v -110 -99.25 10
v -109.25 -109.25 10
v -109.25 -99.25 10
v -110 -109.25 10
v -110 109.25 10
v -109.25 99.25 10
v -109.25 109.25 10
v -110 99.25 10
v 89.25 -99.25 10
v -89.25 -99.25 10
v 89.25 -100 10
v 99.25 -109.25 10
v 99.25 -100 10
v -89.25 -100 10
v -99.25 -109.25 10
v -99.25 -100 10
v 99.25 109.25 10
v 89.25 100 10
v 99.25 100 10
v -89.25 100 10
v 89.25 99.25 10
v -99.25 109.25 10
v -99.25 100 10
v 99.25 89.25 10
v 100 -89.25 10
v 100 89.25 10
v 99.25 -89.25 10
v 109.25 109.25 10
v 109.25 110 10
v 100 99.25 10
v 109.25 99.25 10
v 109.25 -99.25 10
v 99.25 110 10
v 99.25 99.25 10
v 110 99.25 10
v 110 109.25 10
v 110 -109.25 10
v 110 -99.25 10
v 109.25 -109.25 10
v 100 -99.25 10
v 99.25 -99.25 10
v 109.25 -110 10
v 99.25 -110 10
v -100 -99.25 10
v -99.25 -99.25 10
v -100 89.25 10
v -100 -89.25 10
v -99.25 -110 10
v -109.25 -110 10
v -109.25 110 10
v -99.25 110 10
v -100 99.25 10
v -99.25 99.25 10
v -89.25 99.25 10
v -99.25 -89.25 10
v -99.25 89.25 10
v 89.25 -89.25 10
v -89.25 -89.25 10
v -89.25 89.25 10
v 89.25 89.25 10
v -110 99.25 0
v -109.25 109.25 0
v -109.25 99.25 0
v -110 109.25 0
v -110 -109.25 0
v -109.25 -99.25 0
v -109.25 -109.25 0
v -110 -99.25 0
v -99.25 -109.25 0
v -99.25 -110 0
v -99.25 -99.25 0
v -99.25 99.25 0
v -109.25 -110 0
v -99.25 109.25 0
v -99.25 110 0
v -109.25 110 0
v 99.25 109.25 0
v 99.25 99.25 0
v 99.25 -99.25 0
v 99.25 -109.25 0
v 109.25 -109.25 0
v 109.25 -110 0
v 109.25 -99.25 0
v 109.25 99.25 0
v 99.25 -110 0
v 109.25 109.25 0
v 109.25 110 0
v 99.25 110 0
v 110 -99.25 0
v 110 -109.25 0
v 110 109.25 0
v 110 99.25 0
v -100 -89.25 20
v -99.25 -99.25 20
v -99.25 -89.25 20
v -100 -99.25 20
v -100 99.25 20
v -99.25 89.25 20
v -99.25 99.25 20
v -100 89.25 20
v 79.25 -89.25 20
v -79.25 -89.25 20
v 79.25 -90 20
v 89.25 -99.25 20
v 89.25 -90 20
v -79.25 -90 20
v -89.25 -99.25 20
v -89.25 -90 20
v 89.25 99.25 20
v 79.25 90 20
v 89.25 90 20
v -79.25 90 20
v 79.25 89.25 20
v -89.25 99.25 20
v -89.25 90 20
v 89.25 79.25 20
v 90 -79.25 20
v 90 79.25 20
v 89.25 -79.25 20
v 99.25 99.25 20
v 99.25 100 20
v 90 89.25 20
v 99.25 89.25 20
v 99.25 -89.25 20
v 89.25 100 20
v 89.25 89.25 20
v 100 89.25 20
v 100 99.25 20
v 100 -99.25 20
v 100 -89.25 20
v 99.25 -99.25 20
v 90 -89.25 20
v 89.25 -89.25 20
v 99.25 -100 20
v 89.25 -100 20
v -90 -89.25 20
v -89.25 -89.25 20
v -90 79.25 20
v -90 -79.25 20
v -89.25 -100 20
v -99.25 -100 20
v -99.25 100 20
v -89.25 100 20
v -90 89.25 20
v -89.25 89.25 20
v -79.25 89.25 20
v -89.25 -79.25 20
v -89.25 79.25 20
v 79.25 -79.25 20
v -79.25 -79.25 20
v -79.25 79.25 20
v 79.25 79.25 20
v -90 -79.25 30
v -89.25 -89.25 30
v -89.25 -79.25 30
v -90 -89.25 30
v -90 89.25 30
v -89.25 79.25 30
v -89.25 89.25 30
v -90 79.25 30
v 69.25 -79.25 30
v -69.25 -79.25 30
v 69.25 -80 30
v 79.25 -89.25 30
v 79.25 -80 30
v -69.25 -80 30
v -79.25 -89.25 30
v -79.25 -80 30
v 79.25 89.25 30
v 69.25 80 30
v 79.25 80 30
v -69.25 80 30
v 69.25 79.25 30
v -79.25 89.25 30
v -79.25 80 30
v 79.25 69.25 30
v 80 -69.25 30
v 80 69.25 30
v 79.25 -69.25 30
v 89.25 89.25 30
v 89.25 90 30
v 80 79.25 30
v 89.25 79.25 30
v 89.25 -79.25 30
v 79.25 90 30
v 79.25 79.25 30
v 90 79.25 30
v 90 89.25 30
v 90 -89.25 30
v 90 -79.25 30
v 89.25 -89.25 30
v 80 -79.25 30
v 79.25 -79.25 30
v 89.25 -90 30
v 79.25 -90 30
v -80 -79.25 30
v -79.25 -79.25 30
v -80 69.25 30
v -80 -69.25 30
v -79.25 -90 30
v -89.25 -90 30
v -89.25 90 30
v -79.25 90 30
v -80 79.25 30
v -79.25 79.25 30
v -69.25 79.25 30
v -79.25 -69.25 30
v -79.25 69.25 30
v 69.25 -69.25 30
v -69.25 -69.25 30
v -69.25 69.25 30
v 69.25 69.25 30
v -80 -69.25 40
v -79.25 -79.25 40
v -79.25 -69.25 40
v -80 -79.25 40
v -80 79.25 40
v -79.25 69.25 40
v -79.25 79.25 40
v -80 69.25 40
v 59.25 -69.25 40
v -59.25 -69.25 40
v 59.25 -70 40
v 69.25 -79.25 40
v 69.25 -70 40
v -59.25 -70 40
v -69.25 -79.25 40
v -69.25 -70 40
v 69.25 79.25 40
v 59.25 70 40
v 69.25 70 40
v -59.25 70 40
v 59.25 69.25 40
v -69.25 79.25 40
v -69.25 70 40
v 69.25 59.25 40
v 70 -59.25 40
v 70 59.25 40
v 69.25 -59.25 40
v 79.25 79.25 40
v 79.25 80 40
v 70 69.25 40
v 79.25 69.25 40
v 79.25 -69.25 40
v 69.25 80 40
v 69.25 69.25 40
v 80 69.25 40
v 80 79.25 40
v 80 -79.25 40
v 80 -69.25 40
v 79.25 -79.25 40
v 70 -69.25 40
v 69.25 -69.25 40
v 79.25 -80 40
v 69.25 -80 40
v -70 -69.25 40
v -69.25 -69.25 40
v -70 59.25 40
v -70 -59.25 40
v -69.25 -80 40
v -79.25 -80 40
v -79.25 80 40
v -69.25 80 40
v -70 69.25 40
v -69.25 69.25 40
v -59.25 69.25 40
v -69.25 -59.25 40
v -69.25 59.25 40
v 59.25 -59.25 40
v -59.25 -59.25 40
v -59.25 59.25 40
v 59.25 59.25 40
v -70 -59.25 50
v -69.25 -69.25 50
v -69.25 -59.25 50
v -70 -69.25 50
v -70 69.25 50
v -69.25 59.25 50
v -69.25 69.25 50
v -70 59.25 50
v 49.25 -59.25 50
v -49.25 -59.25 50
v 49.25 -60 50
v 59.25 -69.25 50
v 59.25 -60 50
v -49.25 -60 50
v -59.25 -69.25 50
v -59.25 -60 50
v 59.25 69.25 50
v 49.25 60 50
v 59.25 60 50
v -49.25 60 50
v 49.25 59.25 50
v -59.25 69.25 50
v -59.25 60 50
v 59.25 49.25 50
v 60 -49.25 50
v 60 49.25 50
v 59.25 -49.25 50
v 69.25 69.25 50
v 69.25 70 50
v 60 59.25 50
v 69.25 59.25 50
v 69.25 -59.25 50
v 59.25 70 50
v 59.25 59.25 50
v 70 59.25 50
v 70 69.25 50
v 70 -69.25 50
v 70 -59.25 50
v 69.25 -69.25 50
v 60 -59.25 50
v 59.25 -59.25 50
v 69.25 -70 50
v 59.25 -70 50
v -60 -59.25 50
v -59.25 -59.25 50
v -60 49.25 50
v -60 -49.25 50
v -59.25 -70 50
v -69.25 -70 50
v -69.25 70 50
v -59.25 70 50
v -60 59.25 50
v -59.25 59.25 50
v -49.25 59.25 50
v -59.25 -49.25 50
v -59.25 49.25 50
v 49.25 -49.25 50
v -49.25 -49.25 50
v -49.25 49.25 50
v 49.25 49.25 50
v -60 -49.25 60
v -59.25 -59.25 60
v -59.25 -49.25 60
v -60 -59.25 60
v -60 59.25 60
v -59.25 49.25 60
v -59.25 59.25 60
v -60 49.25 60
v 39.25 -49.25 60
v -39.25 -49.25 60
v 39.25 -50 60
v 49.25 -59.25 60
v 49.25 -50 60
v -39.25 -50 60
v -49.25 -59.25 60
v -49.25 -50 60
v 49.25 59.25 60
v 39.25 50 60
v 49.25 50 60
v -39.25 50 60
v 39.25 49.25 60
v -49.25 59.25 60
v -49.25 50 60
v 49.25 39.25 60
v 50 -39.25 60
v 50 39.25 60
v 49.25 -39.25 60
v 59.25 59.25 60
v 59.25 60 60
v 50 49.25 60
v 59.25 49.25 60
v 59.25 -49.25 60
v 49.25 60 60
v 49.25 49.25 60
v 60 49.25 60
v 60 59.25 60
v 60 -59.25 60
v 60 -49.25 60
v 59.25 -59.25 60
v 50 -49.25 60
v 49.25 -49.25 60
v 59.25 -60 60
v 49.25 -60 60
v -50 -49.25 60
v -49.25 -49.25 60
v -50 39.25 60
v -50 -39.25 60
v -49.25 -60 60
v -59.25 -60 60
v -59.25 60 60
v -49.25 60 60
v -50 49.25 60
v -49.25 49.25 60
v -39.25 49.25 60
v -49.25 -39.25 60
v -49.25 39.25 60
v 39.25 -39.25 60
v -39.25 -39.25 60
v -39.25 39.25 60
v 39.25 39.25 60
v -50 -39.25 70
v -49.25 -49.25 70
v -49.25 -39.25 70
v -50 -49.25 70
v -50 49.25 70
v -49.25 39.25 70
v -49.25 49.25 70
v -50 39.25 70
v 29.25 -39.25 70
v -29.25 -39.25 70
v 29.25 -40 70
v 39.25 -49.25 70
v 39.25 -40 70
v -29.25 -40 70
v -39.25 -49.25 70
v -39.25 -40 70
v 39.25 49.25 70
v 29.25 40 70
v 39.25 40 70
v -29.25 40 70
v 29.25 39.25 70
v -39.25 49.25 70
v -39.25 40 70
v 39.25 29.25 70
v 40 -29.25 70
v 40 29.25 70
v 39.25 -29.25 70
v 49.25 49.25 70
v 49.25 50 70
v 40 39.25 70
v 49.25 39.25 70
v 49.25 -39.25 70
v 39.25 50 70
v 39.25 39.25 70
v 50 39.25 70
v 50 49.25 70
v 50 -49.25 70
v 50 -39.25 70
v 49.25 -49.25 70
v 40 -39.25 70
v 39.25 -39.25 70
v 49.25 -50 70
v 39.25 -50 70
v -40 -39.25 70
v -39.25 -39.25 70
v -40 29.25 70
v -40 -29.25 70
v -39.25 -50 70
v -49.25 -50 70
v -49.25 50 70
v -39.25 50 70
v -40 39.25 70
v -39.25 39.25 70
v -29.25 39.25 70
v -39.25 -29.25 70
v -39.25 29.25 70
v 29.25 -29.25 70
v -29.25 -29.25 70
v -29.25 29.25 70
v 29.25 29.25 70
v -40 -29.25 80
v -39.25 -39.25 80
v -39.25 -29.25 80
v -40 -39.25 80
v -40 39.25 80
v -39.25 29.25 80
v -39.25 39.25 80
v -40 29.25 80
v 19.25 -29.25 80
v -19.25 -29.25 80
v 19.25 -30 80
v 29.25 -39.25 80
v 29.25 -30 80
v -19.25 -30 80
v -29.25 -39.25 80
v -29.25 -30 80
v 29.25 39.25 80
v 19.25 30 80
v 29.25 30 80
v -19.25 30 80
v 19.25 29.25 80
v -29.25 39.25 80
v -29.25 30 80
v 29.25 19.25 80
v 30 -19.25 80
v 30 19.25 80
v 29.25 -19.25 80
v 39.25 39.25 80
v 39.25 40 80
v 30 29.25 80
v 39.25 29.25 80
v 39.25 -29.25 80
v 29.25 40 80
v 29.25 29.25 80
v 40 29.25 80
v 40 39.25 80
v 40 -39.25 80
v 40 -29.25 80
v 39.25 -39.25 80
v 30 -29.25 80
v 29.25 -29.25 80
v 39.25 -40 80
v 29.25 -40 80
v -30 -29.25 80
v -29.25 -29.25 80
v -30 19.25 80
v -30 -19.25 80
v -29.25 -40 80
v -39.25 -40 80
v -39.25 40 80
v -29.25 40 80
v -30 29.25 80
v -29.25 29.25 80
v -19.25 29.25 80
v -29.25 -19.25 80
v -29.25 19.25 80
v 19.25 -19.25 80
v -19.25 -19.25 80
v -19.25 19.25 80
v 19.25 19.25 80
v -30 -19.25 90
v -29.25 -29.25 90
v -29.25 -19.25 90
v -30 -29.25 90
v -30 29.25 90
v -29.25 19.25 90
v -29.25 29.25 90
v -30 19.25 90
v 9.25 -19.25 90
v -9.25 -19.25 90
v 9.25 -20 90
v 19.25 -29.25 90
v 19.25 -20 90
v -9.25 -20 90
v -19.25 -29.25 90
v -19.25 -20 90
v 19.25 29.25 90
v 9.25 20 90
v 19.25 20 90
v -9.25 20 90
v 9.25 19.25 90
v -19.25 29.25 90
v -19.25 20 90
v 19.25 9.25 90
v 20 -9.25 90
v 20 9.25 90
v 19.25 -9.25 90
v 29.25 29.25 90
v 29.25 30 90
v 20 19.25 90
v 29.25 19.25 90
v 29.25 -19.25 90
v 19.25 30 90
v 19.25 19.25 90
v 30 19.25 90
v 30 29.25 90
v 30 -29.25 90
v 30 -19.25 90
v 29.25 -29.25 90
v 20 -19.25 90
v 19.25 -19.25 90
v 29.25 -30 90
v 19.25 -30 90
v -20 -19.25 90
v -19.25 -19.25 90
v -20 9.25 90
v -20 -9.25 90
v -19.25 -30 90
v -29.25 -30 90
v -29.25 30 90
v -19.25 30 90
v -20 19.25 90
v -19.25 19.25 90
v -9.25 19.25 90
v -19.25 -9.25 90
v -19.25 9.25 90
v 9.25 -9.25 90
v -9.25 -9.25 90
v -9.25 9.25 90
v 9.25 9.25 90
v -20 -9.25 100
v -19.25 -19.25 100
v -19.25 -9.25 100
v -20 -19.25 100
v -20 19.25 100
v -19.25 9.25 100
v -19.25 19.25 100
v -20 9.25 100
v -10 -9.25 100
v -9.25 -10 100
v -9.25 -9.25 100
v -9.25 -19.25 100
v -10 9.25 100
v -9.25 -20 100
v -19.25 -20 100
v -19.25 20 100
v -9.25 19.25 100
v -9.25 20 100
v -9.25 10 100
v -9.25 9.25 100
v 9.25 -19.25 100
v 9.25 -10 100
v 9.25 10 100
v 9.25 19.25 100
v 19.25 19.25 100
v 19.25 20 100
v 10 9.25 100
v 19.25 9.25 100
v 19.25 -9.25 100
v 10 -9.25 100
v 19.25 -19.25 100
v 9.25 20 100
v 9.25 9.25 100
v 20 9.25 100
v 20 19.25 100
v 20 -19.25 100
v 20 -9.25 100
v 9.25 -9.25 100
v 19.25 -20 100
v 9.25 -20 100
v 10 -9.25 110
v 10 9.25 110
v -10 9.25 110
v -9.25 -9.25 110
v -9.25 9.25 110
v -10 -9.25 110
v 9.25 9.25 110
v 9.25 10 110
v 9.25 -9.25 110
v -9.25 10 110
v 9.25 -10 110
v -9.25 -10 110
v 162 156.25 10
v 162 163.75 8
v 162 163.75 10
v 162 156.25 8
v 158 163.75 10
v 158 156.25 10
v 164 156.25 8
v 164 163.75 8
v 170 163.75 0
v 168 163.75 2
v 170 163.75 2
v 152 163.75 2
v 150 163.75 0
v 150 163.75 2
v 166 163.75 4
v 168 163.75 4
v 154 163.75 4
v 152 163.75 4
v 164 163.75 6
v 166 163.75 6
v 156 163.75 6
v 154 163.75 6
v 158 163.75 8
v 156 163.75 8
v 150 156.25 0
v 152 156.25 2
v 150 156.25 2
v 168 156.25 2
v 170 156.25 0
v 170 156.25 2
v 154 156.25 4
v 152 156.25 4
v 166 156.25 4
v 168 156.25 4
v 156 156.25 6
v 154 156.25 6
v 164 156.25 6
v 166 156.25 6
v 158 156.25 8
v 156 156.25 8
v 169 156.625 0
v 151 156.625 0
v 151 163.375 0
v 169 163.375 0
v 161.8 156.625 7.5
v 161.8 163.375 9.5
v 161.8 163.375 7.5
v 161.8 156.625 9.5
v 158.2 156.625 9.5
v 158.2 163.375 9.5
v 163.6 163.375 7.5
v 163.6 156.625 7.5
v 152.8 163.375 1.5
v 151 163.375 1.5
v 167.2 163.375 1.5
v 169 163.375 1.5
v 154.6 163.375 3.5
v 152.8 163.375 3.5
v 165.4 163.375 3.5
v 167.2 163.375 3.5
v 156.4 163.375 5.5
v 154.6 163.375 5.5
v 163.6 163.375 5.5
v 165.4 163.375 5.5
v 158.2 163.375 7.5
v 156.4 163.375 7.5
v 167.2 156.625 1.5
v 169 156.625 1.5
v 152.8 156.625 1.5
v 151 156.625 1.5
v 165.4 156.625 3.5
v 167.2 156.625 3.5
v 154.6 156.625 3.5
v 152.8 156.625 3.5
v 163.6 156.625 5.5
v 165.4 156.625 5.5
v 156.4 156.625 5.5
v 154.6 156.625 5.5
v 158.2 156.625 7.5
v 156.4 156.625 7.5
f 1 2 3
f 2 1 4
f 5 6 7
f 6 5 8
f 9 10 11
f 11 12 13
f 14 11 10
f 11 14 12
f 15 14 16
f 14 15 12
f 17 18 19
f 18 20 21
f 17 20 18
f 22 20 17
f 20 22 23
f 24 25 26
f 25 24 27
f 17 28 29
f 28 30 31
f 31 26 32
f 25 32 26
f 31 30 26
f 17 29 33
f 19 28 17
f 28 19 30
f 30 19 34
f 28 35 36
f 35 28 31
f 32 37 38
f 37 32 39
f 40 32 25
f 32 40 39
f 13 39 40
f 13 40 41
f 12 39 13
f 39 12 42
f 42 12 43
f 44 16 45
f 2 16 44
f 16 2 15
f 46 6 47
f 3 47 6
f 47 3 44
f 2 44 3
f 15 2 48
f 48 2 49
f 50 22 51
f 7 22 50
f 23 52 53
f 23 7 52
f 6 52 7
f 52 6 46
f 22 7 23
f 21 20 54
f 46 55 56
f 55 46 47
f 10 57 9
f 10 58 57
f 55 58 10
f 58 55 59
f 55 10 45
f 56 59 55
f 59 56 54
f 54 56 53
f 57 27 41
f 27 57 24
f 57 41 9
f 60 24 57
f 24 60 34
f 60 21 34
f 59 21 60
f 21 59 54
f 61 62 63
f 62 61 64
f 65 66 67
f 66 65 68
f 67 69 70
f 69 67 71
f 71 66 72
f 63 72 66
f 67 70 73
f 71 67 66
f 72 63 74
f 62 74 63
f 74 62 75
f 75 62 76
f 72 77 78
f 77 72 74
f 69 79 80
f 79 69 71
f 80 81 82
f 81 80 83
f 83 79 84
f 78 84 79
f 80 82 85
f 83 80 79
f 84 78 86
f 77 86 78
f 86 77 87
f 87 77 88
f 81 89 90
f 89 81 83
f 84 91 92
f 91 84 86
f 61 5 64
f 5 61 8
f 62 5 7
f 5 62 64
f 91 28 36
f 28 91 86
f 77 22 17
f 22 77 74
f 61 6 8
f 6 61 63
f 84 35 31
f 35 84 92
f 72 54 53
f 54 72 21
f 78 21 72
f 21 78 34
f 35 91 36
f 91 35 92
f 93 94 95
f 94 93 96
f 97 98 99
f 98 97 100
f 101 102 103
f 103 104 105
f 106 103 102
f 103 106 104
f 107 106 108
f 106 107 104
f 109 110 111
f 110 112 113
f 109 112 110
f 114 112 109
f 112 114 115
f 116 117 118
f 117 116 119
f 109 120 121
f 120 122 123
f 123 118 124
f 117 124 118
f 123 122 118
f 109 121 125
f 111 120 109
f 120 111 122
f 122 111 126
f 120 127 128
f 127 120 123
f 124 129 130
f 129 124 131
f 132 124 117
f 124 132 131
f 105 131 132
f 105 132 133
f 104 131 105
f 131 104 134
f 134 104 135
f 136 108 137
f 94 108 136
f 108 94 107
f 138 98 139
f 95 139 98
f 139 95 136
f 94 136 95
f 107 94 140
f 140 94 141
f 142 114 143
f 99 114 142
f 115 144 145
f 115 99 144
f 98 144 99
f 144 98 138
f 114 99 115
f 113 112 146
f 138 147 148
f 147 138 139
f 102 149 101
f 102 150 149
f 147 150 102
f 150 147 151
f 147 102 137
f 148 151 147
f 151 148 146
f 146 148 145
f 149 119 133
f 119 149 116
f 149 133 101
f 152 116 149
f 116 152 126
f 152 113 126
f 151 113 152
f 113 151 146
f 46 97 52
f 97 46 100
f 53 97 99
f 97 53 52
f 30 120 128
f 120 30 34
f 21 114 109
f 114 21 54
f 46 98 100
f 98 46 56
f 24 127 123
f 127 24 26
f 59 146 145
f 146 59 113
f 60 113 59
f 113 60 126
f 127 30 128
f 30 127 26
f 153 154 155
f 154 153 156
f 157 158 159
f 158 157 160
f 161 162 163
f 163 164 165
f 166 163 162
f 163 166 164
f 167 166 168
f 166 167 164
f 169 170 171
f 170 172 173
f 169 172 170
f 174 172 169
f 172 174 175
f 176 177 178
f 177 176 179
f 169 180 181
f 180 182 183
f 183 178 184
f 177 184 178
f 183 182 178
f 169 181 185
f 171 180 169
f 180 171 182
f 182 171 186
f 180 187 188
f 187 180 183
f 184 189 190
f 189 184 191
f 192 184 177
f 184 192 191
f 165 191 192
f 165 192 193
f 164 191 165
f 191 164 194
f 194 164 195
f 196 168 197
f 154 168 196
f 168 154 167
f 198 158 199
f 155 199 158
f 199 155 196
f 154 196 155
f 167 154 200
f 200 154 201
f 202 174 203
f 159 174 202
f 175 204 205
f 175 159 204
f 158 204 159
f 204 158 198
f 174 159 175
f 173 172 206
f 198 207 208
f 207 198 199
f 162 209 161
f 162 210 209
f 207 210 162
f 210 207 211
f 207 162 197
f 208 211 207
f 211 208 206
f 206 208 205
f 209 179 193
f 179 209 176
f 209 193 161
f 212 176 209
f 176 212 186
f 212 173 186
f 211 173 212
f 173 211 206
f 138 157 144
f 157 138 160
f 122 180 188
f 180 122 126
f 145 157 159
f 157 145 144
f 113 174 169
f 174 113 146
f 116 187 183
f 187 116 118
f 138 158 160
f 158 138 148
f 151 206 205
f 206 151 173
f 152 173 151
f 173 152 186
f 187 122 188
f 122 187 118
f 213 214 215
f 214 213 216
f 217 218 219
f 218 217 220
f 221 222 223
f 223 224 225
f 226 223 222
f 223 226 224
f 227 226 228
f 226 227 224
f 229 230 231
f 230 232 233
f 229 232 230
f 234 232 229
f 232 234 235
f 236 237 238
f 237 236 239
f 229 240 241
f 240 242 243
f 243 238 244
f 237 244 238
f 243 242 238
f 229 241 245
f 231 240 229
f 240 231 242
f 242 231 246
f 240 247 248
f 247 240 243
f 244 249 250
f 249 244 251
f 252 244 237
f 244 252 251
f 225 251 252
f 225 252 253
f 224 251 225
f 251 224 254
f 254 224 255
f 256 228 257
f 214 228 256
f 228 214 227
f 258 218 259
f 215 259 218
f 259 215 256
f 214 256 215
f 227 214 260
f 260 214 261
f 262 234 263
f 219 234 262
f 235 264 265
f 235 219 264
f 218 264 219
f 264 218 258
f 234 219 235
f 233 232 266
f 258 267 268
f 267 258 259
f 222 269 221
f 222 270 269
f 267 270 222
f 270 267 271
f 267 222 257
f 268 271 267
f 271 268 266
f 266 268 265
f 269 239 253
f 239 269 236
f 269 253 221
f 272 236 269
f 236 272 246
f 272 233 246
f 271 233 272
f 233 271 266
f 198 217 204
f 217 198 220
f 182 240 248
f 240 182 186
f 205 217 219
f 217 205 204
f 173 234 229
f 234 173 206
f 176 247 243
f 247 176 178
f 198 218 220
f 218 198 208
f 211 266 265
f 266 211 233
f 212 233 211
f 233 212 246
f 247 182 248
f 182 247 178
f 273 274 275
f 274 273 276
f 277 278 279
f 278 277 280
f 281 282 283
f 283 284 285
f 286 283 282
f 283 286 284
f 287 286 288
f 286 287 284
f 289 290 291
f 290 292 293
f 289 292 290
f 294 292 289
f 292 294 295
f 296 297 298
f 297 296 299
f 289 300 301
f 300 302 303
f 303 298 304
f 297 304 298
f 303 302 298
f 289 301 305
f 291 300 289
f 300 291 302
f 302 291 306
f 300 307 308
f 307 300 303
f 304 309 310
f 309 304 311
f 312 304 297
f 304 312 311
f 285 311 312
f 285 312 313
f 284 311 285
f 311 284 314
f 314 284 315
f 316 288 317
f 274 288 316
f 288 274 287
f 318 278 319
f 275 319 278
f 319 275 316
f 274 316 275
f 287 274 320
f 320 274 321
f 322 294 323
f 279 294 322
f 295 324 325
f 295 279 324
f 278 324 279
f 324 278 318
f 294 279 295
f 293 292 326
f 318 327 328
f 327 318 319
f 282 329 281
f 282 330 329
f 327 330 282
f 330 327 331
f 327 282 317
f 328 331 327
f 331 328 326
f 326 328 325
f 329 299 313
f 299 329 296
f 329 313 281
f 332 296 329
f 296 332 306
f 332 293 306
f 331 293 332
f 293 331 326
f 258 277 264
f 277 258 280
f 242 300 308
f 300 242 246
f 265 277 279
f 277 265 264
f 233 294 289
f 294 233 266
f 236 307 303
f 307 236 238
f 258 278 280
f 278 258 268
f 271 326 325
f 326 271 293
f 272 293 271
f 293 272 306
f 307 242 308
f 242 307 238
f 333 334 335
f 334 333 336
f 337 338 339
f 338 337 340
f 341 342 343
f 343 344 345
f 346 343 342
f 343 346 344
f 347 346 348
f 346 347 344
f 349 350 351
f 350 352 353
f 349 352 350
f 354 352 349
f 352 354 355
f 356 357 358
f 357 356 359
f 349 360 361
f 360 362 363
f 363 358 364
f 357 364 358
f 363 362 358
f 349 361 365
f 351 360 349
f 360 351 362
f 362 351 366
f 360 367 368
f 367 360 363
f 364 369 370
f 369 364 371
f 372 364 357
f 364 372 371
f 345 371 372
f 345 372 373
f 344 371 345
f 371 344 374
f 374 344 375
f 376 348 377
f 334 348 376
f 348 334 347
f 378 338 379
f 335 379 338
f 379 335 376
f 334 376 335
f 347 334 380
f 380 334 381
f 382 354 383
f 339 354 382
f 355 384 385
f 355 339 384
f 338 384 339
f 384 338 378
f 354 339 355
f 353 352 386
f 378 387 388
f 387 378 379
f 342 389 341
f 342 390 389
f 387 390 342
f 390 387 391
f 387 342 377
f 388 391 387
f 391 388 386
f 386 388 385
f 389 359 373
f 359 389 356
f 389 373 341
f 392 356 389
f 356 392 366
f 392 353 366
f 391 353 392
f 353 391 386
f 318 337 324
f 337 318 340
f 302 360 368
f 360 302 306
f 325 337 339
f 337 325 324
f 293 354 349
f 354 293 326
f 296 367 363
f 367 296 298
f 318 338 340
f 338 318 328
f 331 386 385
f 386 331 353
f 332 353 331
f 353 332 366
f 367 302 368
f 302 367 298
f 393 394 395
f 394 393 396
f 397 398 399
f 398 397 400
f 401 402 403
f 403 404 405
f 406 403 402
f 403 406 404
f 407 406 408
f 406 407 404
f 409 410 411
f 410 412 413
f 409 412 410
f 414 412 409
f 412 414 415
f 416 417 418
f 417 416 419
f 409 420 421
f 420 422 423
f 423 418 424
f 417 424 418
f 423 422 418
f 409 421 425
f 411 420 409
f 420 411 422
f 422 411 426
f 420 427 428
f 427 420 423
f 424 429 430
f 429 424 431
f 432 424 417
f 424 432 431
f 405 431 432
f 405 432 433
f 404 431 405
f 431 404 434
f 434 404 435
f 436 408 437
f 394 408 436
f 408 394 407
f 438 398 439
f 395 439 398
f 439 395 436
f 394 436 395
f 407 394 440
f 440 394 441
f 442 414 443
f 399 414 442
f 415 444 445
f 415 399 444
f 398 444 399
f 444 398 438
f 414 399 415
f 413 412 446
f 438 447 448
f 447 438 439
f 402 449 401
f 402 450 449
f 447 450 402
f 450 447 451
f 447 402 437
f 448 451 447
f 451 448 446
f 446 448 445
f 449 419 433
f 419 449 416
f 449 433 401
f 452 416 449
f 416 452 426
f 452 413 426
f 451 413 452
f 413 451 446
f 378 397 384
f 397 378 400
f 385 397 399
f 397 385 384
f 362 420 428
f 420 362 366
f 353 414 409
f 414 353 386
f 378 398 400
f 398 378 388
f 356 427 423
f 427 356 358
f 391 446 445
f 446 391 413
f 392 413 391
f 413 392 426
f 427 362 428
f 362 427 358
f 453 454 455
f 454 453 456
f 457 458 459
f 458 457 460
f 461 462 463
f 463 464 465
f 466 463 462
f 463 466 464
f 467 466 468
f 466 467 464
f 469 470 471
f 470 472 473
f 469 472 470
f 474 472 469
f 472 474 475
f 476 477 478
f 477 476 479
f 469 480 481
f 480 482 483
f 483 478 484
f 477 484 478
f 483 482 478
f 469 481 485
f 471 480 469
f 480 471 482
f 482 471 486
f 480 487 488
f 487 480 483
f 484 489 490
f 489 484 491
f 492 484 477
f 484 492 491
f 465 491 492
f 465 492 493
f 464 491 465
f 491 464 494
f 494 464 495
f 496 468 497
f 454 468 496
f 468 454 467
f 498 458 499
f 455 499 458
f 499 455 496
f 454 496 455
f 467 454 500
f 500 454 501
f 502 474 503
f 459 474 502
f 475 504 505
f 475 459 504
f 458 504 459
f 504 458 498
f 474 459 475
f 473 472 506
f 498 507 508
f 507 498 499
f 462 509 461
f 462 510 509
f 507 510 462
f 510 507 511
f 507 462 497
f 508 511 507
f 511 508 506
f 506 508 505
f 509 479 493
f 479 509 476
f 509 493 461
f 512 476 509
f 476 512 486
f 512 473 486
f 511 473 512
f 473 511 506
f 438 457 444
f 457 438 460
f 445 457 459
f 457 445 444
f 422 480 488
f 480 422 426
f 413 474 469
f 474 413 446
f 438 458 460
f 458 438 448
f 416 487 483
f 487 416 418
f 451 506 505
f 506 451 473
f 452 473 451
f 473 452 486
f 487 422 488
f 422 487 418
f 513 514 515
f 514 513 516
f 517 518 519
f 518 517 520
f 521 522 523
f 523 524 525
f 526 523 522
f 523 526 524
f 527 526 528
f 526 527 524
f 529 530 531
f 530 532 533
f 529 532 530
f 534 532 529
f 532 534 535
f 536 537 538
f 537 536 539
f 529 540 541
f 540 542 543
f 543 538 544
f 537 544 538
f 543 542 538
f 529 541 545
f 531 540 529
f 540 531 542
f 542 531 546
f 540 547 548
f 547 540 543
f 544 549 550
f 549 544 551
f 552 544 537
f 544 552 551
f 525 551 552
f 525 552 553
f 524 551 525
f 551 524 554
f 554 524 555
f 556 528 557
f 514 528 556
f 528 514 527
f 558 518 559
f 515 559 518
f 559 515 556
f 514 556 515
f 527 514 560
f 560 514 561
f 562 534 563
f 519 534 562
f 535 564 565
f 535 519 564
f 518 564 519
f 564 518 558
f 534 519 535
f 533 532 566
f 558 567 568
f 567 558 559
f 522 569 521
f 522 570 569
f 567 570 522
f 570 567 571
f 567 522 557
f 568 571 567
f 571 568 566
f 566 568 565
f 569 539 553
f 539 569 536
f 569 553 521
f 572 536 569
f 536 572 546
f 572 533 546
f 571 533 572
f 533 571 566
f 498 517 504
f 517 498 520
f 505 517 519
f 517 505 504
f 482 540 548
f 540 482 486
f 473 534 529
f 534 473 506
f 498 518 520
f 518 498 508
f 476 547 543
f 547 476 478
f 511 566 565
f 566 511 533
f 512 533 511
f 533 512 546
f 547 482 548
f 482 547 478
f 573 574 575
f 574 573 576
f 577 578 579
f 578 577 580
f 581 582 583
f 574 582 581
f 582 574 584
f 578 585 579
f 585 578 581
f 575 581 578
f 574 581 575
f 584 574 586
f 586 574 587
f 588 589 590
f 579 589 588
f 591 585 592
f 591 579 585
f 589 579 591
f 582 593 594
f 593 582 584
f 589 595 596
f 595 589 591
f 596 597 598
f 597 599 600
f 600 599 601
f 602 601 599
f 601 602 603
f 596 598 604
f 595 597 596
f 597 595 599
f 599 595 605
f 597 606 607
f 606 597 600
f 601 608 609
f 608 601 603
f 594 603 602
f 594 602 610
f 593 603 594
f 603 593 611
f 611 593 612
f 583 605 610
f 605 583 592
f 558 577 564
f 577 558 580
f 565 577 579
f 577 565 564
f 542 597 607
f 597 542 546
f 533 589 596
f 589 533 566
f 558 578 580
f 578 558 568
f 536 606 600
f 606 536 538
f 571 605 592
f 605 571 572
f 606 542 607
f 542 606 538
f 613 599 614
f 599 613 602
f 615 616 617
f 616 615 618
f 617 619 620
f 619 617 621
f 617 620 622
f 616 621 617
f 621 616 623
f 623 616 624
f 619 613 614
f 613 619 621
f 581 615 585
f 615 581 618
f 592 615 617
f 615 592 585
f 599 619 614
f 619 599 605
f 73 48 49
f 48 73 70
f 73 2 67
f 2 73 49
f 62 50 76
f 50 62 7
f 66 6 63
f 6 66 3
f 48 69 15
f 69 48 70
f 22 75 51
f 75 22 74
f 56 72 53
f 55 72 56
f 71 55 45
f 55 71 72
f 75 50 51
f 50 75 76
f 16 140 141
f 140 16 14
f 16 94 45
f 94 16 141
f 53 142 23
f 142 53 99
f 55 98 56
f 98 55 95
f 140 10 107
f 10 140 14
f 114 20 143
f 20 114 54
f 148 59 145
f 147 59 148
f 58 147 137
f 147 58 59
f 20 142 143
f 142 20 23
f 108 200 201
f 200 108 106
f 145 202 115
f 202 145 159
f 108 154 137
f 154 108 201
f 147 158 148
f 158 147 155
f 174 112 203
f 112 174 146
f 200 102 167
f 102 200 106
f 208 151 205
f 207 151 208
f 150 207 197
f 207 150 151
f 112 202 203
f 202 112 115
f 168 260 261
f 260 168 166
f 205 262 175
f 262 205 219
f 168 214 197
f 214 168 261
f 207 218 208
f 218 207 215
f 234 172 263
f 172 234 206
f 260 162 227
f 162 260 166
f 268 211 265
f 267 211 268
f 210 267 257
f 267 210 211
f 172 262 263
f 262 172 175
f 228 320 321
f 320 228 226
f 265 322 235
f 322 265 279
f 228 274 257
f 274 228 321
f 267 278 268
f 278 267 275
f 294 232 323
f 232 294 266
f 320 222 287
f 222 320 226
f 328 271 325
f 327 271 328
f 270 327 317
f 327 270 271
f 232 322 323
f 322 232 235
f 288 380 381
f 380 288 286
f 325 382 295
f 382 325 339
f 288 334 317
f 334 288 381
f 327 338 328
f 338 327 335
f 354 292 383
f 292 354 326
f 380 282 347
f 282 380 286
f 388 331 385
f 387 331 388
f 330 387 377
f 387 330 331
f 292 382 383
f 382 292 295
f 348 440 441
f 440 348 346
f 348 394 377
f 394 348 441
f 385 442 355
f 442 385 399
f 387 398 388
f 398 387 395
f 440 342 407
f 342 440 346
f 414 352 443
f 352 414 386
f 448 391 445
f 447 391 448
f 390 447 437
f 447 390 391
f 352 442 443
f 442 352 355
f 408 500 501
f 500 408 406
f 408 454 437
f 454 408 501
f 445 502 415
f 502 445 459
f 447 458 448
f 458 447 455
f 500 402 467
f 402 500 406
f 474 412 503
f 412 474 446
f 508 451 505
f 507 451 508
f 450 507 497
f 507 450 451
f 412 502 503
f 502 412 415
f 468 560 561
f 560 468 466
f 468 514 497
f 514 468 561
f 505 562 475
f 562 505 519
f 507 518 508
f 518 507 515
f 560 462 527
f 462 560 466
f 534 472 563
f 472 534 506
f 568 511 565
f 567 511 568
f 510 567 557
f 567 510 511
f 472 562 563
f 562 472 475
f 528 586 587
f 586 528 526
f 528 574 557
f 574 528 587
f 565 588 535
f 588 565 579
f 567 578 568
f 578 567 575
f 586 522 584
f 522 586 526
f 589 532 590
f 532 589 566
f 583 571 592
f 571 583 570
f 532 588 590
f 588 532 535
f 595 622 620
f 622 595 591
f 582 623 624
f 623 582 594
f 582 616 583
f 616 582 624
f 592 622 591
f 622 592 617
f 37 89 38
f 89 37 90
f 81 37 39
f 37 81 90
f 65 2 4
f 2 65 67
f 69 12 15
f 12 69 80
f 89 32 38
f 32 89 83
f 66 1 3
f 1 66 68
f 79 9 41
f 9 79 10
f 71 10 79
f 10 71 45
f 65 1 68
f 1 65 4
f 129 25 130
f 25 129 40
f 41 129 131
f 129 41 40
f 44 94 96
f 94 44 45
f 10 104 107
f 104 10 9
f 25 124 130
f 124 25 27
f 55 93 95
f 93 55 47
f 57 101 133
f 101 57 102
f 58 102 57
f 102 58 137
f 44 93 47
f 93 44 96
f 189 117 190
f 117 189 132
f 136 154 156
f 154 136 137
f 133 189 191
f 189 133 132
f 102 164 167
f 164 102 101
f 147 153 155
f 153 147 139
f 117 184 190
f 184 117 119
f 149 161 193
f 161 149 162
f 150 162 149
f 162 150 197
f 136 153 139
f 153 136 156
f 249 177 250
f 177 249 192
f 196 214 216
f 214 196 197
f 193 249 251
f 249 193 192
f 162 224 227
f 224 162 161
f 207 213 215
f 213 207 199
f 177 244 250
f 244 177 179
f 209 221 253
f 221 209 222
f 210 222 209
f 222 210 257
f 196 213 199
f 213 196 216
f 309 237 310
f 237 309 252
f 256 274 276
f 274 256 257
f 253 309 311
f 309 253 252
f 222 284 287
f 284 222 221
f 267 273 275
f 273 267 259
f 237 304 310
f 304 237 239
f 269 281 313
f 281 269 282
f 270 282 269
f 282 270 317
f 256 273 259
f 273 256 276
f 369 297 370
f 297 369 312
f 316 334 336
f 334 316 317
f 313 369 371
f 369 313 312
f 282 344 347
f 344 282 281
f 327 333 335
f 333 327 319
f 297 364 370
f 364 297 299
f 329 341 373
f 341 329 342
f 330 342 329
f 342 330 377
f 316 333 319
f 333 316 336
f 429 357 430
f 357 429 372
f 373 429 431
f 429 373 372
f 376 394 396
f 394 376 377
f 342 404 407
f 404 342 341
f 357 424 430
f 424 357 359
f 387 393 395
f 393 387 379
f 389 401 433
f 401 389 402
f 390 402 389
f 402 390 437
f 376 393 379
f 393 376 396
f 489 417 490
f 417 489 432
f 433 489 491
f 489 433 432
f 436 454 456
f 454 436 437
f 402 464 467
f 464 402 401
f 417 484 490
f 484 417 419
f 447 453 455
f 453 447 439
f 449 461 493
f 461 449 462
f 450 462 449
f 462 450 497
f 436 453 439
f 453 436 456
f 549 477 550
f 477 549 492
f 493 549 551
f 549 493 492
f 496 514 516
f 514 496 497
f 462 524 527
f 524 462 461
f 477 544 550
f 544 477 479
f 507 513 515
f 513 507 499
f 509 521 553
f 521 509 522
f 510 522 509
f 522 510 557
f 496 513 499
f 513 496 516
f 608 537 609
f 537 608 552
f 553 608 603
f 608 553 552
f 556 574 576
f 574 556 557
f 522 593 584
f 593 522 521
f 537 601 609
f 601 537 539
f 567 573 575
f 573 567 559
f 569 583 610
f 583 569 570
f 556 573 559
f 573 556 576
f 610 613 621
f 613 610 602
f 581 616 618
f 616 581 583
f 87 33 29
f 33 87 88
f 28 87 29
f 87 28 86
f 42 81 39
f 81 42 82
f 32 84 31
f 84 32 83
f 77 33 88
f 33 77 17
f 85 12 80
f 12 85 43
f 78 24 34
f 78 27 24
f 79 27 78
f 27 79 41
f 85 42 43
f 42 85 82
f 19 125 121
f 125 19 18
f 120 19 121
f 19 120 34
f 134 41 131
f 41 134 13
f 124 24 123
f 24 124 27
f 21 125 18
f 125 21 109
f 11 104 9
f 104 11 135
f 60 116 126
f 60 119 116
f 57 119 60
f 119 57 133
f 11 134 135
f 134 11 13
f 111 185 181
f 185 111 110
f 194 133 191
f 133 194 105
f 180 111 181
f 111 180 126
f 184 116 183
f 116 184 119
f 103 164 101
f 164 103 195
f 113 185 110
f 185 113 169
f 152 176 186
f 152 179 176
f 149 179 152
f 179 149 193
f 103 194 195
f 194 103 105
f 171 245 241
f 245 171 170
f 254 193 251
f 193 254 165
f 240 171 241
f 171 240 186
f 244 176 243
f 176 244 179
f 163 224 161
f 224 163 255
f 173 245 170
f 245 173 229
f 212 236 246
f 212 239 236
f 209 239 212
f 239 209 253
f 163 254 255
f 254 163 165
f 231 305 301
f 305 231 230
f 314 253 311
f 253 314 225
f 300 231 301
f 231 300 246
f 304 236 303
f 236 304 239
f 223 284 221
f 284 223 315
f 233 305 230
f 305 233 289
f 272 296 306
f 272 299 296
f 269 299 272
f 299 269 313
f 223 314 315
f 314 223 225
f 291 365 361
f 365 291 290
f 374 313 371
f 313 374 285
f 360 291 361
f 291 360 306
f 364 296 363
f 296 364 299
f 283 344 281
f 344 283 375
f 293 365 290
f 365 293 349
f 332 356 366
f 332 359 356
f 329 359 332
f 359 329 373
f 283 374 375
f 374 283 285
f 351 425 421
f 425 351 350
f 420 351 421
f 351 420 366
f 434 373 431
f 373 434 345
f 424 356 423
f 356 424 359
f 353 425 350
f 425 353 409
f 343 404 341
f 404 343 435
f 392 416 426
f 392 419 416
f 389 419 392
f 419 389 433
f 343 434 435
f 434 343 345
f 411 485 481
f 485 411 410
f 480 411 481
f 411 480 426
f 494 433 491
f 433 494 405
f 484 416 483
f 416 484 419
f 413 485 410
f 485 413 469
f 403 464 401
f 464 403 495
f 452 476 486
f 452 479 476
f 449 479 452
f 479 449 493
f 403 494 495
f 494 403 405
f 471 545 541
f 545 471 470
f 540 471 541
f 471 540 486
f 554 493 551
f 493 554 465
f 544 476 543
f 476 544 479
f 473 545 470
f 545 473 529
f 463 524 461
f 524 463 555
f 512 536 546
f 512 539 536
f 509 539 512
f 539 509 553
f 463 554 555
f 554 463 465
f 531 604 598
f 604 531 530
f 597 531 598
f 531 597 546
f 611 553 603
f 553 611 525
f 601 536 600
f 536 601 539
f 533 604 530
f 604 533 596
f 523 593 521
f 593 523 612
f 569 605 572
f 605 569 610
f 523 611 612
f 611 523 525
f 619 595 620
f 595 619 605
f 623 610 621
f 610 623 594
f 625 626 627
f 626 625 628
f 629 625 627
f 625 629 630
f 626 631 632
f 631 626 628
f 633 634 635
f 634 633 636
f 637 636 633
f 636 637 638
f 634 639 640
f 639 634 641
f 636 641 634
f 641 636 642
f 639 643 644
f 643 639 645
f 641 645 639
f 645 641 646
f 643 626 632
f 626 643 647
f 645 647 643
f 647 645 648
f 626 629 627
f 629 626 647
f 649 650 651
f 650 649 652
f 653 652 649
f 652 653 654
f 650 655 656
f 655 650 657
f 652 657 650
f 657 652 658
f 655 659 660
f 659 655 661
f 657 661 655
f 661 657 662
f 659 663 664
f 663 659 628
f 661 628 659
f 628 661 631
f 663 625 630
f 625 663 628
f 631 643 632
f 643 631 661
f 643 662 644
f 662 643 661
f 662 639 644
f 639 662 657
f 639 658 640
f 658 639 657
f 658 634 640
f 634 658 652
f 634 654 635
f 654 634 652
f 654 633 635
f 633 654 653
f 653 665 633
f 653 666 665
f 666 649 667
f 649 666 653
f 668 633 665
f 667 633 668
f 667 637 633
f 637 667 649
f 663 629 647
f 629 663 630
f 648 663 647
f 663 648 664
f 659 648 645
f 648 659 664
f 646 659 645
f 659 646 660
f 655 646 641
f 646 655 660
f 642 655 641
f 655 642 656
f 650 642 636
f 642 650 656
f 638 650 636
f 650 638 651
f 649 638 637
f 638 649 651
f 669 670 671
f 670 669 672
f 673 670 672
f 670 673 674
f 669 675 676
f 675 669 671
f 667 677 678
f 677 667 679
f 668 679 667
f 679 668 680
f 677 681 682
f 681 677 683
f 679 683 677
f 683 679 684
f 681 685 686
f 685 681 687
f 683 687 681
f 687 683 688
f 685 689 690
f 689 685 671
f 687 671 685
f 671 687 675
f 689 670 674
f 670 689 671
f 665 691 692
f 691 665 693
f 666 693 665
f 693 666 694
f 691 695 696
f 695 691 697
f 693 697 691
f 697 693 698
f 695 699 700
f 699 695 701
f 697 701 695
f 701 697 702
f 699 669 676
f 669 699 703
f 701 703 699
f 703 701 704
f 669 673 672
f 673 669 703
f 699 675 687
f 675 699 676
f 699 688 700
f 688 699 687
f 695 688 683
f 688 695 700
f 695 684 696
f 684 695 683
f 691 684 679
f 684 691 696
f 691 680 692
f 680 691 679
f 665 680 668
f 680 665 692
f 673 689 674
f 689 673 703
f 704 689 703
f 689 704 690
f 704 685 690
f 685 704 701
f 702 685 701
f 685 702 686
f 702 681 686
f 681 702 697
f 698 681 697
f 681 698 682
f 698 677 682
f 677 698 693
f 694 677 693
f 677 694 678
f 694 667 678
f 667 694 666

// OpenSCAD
scale = 100; // [50:10:250]
pyramid(scale=scale);
translate([(scale*0.4)*(scale*0.04),(scale*0.4)*(scale*0.04),0])
mirrored_stairs_mold(scale=scale);

//*****All modules that were used for this******

//************************************************
// Stairs.scad: Produces 1 set of stairs
//
//			   <--->xdelta
//			   |   |
//			---	   |  |
//	zheight|	   |  |
//		---		   | / <ywidth
//	   |		   |/ 
//		<--xlength->

//************************************************

module stairs(xlength=20, xdelta=2, ywidth=5, zheight=2)
{
	for(x=[xlength:-xdelta:0])
	{
		translate([0,-ywidth/2,zheight*x/xdelta]) 
		color([sin(x*xdelta),sin(x*ywidth),sin(x*zheight)]) //use sin(x) function to make sure the value is between 0 and 1
		cube([xlength-x,ywidth,zheight]);
	}
}
//************************************************
module pyramid_side(ywidth=5,xlength=20,zheight=20,ystep=10){
	union()
	{
		translate([0,ystep*(ystep+1.3),0]) //figuring out the right factor for smooth pyramid-style
		{
			for(z=[0:zheight:ystep*zheight])
			{
				for(x=[-xlength*ystep+z:2*xlength:xlength*ystep-z]) //this one ensures that we get a triangular side of a pyramid
				{
					
					translate([x,-(z/zheight)*ystep,z])
					{
						translate([0,-((ystep-ywidth)/2)-ywidth,zheight/2])
						color([sin(x),cos(z),0])
						cube([2*xlength,ystep,zheight],center=true);
					}
				}
			}
		}
	}
}
//************************************************
module pyramid(scale=200)
{
	ywidth = scale/200*15;
	ystep = scale/10;
	xlength=scale/10;
	zheight=scale/10;
	for(r=[0:90:359])
	{
		rotate([0,0,r])
		pyramid_side(ystep=ystep,ywidth=ywidth,xlength=xlength,zheight=zheight);
	}
}
//************************************************
module mirrored_stairs(scale=200)
{
	ywidth = scale/200*15;
	xlength=scale/10;
	stairs(ywidth=ywidth,xlength=xlength);
	mirror([1,0,0])				//mirror the stairs for double stair-pair awesomeness
	stairs(ywidth=ywidth,xlength=xlength);
}
//************************************************
module mirrored_stairs_mold(scale=200)
{
	difference()
	{
		mirrored_stairs(scale=scale);
		scale([0.9,0.9,1])
		translate([0,0,-0.5])
		mirrored_stairs(scale=scale);
	}
}
